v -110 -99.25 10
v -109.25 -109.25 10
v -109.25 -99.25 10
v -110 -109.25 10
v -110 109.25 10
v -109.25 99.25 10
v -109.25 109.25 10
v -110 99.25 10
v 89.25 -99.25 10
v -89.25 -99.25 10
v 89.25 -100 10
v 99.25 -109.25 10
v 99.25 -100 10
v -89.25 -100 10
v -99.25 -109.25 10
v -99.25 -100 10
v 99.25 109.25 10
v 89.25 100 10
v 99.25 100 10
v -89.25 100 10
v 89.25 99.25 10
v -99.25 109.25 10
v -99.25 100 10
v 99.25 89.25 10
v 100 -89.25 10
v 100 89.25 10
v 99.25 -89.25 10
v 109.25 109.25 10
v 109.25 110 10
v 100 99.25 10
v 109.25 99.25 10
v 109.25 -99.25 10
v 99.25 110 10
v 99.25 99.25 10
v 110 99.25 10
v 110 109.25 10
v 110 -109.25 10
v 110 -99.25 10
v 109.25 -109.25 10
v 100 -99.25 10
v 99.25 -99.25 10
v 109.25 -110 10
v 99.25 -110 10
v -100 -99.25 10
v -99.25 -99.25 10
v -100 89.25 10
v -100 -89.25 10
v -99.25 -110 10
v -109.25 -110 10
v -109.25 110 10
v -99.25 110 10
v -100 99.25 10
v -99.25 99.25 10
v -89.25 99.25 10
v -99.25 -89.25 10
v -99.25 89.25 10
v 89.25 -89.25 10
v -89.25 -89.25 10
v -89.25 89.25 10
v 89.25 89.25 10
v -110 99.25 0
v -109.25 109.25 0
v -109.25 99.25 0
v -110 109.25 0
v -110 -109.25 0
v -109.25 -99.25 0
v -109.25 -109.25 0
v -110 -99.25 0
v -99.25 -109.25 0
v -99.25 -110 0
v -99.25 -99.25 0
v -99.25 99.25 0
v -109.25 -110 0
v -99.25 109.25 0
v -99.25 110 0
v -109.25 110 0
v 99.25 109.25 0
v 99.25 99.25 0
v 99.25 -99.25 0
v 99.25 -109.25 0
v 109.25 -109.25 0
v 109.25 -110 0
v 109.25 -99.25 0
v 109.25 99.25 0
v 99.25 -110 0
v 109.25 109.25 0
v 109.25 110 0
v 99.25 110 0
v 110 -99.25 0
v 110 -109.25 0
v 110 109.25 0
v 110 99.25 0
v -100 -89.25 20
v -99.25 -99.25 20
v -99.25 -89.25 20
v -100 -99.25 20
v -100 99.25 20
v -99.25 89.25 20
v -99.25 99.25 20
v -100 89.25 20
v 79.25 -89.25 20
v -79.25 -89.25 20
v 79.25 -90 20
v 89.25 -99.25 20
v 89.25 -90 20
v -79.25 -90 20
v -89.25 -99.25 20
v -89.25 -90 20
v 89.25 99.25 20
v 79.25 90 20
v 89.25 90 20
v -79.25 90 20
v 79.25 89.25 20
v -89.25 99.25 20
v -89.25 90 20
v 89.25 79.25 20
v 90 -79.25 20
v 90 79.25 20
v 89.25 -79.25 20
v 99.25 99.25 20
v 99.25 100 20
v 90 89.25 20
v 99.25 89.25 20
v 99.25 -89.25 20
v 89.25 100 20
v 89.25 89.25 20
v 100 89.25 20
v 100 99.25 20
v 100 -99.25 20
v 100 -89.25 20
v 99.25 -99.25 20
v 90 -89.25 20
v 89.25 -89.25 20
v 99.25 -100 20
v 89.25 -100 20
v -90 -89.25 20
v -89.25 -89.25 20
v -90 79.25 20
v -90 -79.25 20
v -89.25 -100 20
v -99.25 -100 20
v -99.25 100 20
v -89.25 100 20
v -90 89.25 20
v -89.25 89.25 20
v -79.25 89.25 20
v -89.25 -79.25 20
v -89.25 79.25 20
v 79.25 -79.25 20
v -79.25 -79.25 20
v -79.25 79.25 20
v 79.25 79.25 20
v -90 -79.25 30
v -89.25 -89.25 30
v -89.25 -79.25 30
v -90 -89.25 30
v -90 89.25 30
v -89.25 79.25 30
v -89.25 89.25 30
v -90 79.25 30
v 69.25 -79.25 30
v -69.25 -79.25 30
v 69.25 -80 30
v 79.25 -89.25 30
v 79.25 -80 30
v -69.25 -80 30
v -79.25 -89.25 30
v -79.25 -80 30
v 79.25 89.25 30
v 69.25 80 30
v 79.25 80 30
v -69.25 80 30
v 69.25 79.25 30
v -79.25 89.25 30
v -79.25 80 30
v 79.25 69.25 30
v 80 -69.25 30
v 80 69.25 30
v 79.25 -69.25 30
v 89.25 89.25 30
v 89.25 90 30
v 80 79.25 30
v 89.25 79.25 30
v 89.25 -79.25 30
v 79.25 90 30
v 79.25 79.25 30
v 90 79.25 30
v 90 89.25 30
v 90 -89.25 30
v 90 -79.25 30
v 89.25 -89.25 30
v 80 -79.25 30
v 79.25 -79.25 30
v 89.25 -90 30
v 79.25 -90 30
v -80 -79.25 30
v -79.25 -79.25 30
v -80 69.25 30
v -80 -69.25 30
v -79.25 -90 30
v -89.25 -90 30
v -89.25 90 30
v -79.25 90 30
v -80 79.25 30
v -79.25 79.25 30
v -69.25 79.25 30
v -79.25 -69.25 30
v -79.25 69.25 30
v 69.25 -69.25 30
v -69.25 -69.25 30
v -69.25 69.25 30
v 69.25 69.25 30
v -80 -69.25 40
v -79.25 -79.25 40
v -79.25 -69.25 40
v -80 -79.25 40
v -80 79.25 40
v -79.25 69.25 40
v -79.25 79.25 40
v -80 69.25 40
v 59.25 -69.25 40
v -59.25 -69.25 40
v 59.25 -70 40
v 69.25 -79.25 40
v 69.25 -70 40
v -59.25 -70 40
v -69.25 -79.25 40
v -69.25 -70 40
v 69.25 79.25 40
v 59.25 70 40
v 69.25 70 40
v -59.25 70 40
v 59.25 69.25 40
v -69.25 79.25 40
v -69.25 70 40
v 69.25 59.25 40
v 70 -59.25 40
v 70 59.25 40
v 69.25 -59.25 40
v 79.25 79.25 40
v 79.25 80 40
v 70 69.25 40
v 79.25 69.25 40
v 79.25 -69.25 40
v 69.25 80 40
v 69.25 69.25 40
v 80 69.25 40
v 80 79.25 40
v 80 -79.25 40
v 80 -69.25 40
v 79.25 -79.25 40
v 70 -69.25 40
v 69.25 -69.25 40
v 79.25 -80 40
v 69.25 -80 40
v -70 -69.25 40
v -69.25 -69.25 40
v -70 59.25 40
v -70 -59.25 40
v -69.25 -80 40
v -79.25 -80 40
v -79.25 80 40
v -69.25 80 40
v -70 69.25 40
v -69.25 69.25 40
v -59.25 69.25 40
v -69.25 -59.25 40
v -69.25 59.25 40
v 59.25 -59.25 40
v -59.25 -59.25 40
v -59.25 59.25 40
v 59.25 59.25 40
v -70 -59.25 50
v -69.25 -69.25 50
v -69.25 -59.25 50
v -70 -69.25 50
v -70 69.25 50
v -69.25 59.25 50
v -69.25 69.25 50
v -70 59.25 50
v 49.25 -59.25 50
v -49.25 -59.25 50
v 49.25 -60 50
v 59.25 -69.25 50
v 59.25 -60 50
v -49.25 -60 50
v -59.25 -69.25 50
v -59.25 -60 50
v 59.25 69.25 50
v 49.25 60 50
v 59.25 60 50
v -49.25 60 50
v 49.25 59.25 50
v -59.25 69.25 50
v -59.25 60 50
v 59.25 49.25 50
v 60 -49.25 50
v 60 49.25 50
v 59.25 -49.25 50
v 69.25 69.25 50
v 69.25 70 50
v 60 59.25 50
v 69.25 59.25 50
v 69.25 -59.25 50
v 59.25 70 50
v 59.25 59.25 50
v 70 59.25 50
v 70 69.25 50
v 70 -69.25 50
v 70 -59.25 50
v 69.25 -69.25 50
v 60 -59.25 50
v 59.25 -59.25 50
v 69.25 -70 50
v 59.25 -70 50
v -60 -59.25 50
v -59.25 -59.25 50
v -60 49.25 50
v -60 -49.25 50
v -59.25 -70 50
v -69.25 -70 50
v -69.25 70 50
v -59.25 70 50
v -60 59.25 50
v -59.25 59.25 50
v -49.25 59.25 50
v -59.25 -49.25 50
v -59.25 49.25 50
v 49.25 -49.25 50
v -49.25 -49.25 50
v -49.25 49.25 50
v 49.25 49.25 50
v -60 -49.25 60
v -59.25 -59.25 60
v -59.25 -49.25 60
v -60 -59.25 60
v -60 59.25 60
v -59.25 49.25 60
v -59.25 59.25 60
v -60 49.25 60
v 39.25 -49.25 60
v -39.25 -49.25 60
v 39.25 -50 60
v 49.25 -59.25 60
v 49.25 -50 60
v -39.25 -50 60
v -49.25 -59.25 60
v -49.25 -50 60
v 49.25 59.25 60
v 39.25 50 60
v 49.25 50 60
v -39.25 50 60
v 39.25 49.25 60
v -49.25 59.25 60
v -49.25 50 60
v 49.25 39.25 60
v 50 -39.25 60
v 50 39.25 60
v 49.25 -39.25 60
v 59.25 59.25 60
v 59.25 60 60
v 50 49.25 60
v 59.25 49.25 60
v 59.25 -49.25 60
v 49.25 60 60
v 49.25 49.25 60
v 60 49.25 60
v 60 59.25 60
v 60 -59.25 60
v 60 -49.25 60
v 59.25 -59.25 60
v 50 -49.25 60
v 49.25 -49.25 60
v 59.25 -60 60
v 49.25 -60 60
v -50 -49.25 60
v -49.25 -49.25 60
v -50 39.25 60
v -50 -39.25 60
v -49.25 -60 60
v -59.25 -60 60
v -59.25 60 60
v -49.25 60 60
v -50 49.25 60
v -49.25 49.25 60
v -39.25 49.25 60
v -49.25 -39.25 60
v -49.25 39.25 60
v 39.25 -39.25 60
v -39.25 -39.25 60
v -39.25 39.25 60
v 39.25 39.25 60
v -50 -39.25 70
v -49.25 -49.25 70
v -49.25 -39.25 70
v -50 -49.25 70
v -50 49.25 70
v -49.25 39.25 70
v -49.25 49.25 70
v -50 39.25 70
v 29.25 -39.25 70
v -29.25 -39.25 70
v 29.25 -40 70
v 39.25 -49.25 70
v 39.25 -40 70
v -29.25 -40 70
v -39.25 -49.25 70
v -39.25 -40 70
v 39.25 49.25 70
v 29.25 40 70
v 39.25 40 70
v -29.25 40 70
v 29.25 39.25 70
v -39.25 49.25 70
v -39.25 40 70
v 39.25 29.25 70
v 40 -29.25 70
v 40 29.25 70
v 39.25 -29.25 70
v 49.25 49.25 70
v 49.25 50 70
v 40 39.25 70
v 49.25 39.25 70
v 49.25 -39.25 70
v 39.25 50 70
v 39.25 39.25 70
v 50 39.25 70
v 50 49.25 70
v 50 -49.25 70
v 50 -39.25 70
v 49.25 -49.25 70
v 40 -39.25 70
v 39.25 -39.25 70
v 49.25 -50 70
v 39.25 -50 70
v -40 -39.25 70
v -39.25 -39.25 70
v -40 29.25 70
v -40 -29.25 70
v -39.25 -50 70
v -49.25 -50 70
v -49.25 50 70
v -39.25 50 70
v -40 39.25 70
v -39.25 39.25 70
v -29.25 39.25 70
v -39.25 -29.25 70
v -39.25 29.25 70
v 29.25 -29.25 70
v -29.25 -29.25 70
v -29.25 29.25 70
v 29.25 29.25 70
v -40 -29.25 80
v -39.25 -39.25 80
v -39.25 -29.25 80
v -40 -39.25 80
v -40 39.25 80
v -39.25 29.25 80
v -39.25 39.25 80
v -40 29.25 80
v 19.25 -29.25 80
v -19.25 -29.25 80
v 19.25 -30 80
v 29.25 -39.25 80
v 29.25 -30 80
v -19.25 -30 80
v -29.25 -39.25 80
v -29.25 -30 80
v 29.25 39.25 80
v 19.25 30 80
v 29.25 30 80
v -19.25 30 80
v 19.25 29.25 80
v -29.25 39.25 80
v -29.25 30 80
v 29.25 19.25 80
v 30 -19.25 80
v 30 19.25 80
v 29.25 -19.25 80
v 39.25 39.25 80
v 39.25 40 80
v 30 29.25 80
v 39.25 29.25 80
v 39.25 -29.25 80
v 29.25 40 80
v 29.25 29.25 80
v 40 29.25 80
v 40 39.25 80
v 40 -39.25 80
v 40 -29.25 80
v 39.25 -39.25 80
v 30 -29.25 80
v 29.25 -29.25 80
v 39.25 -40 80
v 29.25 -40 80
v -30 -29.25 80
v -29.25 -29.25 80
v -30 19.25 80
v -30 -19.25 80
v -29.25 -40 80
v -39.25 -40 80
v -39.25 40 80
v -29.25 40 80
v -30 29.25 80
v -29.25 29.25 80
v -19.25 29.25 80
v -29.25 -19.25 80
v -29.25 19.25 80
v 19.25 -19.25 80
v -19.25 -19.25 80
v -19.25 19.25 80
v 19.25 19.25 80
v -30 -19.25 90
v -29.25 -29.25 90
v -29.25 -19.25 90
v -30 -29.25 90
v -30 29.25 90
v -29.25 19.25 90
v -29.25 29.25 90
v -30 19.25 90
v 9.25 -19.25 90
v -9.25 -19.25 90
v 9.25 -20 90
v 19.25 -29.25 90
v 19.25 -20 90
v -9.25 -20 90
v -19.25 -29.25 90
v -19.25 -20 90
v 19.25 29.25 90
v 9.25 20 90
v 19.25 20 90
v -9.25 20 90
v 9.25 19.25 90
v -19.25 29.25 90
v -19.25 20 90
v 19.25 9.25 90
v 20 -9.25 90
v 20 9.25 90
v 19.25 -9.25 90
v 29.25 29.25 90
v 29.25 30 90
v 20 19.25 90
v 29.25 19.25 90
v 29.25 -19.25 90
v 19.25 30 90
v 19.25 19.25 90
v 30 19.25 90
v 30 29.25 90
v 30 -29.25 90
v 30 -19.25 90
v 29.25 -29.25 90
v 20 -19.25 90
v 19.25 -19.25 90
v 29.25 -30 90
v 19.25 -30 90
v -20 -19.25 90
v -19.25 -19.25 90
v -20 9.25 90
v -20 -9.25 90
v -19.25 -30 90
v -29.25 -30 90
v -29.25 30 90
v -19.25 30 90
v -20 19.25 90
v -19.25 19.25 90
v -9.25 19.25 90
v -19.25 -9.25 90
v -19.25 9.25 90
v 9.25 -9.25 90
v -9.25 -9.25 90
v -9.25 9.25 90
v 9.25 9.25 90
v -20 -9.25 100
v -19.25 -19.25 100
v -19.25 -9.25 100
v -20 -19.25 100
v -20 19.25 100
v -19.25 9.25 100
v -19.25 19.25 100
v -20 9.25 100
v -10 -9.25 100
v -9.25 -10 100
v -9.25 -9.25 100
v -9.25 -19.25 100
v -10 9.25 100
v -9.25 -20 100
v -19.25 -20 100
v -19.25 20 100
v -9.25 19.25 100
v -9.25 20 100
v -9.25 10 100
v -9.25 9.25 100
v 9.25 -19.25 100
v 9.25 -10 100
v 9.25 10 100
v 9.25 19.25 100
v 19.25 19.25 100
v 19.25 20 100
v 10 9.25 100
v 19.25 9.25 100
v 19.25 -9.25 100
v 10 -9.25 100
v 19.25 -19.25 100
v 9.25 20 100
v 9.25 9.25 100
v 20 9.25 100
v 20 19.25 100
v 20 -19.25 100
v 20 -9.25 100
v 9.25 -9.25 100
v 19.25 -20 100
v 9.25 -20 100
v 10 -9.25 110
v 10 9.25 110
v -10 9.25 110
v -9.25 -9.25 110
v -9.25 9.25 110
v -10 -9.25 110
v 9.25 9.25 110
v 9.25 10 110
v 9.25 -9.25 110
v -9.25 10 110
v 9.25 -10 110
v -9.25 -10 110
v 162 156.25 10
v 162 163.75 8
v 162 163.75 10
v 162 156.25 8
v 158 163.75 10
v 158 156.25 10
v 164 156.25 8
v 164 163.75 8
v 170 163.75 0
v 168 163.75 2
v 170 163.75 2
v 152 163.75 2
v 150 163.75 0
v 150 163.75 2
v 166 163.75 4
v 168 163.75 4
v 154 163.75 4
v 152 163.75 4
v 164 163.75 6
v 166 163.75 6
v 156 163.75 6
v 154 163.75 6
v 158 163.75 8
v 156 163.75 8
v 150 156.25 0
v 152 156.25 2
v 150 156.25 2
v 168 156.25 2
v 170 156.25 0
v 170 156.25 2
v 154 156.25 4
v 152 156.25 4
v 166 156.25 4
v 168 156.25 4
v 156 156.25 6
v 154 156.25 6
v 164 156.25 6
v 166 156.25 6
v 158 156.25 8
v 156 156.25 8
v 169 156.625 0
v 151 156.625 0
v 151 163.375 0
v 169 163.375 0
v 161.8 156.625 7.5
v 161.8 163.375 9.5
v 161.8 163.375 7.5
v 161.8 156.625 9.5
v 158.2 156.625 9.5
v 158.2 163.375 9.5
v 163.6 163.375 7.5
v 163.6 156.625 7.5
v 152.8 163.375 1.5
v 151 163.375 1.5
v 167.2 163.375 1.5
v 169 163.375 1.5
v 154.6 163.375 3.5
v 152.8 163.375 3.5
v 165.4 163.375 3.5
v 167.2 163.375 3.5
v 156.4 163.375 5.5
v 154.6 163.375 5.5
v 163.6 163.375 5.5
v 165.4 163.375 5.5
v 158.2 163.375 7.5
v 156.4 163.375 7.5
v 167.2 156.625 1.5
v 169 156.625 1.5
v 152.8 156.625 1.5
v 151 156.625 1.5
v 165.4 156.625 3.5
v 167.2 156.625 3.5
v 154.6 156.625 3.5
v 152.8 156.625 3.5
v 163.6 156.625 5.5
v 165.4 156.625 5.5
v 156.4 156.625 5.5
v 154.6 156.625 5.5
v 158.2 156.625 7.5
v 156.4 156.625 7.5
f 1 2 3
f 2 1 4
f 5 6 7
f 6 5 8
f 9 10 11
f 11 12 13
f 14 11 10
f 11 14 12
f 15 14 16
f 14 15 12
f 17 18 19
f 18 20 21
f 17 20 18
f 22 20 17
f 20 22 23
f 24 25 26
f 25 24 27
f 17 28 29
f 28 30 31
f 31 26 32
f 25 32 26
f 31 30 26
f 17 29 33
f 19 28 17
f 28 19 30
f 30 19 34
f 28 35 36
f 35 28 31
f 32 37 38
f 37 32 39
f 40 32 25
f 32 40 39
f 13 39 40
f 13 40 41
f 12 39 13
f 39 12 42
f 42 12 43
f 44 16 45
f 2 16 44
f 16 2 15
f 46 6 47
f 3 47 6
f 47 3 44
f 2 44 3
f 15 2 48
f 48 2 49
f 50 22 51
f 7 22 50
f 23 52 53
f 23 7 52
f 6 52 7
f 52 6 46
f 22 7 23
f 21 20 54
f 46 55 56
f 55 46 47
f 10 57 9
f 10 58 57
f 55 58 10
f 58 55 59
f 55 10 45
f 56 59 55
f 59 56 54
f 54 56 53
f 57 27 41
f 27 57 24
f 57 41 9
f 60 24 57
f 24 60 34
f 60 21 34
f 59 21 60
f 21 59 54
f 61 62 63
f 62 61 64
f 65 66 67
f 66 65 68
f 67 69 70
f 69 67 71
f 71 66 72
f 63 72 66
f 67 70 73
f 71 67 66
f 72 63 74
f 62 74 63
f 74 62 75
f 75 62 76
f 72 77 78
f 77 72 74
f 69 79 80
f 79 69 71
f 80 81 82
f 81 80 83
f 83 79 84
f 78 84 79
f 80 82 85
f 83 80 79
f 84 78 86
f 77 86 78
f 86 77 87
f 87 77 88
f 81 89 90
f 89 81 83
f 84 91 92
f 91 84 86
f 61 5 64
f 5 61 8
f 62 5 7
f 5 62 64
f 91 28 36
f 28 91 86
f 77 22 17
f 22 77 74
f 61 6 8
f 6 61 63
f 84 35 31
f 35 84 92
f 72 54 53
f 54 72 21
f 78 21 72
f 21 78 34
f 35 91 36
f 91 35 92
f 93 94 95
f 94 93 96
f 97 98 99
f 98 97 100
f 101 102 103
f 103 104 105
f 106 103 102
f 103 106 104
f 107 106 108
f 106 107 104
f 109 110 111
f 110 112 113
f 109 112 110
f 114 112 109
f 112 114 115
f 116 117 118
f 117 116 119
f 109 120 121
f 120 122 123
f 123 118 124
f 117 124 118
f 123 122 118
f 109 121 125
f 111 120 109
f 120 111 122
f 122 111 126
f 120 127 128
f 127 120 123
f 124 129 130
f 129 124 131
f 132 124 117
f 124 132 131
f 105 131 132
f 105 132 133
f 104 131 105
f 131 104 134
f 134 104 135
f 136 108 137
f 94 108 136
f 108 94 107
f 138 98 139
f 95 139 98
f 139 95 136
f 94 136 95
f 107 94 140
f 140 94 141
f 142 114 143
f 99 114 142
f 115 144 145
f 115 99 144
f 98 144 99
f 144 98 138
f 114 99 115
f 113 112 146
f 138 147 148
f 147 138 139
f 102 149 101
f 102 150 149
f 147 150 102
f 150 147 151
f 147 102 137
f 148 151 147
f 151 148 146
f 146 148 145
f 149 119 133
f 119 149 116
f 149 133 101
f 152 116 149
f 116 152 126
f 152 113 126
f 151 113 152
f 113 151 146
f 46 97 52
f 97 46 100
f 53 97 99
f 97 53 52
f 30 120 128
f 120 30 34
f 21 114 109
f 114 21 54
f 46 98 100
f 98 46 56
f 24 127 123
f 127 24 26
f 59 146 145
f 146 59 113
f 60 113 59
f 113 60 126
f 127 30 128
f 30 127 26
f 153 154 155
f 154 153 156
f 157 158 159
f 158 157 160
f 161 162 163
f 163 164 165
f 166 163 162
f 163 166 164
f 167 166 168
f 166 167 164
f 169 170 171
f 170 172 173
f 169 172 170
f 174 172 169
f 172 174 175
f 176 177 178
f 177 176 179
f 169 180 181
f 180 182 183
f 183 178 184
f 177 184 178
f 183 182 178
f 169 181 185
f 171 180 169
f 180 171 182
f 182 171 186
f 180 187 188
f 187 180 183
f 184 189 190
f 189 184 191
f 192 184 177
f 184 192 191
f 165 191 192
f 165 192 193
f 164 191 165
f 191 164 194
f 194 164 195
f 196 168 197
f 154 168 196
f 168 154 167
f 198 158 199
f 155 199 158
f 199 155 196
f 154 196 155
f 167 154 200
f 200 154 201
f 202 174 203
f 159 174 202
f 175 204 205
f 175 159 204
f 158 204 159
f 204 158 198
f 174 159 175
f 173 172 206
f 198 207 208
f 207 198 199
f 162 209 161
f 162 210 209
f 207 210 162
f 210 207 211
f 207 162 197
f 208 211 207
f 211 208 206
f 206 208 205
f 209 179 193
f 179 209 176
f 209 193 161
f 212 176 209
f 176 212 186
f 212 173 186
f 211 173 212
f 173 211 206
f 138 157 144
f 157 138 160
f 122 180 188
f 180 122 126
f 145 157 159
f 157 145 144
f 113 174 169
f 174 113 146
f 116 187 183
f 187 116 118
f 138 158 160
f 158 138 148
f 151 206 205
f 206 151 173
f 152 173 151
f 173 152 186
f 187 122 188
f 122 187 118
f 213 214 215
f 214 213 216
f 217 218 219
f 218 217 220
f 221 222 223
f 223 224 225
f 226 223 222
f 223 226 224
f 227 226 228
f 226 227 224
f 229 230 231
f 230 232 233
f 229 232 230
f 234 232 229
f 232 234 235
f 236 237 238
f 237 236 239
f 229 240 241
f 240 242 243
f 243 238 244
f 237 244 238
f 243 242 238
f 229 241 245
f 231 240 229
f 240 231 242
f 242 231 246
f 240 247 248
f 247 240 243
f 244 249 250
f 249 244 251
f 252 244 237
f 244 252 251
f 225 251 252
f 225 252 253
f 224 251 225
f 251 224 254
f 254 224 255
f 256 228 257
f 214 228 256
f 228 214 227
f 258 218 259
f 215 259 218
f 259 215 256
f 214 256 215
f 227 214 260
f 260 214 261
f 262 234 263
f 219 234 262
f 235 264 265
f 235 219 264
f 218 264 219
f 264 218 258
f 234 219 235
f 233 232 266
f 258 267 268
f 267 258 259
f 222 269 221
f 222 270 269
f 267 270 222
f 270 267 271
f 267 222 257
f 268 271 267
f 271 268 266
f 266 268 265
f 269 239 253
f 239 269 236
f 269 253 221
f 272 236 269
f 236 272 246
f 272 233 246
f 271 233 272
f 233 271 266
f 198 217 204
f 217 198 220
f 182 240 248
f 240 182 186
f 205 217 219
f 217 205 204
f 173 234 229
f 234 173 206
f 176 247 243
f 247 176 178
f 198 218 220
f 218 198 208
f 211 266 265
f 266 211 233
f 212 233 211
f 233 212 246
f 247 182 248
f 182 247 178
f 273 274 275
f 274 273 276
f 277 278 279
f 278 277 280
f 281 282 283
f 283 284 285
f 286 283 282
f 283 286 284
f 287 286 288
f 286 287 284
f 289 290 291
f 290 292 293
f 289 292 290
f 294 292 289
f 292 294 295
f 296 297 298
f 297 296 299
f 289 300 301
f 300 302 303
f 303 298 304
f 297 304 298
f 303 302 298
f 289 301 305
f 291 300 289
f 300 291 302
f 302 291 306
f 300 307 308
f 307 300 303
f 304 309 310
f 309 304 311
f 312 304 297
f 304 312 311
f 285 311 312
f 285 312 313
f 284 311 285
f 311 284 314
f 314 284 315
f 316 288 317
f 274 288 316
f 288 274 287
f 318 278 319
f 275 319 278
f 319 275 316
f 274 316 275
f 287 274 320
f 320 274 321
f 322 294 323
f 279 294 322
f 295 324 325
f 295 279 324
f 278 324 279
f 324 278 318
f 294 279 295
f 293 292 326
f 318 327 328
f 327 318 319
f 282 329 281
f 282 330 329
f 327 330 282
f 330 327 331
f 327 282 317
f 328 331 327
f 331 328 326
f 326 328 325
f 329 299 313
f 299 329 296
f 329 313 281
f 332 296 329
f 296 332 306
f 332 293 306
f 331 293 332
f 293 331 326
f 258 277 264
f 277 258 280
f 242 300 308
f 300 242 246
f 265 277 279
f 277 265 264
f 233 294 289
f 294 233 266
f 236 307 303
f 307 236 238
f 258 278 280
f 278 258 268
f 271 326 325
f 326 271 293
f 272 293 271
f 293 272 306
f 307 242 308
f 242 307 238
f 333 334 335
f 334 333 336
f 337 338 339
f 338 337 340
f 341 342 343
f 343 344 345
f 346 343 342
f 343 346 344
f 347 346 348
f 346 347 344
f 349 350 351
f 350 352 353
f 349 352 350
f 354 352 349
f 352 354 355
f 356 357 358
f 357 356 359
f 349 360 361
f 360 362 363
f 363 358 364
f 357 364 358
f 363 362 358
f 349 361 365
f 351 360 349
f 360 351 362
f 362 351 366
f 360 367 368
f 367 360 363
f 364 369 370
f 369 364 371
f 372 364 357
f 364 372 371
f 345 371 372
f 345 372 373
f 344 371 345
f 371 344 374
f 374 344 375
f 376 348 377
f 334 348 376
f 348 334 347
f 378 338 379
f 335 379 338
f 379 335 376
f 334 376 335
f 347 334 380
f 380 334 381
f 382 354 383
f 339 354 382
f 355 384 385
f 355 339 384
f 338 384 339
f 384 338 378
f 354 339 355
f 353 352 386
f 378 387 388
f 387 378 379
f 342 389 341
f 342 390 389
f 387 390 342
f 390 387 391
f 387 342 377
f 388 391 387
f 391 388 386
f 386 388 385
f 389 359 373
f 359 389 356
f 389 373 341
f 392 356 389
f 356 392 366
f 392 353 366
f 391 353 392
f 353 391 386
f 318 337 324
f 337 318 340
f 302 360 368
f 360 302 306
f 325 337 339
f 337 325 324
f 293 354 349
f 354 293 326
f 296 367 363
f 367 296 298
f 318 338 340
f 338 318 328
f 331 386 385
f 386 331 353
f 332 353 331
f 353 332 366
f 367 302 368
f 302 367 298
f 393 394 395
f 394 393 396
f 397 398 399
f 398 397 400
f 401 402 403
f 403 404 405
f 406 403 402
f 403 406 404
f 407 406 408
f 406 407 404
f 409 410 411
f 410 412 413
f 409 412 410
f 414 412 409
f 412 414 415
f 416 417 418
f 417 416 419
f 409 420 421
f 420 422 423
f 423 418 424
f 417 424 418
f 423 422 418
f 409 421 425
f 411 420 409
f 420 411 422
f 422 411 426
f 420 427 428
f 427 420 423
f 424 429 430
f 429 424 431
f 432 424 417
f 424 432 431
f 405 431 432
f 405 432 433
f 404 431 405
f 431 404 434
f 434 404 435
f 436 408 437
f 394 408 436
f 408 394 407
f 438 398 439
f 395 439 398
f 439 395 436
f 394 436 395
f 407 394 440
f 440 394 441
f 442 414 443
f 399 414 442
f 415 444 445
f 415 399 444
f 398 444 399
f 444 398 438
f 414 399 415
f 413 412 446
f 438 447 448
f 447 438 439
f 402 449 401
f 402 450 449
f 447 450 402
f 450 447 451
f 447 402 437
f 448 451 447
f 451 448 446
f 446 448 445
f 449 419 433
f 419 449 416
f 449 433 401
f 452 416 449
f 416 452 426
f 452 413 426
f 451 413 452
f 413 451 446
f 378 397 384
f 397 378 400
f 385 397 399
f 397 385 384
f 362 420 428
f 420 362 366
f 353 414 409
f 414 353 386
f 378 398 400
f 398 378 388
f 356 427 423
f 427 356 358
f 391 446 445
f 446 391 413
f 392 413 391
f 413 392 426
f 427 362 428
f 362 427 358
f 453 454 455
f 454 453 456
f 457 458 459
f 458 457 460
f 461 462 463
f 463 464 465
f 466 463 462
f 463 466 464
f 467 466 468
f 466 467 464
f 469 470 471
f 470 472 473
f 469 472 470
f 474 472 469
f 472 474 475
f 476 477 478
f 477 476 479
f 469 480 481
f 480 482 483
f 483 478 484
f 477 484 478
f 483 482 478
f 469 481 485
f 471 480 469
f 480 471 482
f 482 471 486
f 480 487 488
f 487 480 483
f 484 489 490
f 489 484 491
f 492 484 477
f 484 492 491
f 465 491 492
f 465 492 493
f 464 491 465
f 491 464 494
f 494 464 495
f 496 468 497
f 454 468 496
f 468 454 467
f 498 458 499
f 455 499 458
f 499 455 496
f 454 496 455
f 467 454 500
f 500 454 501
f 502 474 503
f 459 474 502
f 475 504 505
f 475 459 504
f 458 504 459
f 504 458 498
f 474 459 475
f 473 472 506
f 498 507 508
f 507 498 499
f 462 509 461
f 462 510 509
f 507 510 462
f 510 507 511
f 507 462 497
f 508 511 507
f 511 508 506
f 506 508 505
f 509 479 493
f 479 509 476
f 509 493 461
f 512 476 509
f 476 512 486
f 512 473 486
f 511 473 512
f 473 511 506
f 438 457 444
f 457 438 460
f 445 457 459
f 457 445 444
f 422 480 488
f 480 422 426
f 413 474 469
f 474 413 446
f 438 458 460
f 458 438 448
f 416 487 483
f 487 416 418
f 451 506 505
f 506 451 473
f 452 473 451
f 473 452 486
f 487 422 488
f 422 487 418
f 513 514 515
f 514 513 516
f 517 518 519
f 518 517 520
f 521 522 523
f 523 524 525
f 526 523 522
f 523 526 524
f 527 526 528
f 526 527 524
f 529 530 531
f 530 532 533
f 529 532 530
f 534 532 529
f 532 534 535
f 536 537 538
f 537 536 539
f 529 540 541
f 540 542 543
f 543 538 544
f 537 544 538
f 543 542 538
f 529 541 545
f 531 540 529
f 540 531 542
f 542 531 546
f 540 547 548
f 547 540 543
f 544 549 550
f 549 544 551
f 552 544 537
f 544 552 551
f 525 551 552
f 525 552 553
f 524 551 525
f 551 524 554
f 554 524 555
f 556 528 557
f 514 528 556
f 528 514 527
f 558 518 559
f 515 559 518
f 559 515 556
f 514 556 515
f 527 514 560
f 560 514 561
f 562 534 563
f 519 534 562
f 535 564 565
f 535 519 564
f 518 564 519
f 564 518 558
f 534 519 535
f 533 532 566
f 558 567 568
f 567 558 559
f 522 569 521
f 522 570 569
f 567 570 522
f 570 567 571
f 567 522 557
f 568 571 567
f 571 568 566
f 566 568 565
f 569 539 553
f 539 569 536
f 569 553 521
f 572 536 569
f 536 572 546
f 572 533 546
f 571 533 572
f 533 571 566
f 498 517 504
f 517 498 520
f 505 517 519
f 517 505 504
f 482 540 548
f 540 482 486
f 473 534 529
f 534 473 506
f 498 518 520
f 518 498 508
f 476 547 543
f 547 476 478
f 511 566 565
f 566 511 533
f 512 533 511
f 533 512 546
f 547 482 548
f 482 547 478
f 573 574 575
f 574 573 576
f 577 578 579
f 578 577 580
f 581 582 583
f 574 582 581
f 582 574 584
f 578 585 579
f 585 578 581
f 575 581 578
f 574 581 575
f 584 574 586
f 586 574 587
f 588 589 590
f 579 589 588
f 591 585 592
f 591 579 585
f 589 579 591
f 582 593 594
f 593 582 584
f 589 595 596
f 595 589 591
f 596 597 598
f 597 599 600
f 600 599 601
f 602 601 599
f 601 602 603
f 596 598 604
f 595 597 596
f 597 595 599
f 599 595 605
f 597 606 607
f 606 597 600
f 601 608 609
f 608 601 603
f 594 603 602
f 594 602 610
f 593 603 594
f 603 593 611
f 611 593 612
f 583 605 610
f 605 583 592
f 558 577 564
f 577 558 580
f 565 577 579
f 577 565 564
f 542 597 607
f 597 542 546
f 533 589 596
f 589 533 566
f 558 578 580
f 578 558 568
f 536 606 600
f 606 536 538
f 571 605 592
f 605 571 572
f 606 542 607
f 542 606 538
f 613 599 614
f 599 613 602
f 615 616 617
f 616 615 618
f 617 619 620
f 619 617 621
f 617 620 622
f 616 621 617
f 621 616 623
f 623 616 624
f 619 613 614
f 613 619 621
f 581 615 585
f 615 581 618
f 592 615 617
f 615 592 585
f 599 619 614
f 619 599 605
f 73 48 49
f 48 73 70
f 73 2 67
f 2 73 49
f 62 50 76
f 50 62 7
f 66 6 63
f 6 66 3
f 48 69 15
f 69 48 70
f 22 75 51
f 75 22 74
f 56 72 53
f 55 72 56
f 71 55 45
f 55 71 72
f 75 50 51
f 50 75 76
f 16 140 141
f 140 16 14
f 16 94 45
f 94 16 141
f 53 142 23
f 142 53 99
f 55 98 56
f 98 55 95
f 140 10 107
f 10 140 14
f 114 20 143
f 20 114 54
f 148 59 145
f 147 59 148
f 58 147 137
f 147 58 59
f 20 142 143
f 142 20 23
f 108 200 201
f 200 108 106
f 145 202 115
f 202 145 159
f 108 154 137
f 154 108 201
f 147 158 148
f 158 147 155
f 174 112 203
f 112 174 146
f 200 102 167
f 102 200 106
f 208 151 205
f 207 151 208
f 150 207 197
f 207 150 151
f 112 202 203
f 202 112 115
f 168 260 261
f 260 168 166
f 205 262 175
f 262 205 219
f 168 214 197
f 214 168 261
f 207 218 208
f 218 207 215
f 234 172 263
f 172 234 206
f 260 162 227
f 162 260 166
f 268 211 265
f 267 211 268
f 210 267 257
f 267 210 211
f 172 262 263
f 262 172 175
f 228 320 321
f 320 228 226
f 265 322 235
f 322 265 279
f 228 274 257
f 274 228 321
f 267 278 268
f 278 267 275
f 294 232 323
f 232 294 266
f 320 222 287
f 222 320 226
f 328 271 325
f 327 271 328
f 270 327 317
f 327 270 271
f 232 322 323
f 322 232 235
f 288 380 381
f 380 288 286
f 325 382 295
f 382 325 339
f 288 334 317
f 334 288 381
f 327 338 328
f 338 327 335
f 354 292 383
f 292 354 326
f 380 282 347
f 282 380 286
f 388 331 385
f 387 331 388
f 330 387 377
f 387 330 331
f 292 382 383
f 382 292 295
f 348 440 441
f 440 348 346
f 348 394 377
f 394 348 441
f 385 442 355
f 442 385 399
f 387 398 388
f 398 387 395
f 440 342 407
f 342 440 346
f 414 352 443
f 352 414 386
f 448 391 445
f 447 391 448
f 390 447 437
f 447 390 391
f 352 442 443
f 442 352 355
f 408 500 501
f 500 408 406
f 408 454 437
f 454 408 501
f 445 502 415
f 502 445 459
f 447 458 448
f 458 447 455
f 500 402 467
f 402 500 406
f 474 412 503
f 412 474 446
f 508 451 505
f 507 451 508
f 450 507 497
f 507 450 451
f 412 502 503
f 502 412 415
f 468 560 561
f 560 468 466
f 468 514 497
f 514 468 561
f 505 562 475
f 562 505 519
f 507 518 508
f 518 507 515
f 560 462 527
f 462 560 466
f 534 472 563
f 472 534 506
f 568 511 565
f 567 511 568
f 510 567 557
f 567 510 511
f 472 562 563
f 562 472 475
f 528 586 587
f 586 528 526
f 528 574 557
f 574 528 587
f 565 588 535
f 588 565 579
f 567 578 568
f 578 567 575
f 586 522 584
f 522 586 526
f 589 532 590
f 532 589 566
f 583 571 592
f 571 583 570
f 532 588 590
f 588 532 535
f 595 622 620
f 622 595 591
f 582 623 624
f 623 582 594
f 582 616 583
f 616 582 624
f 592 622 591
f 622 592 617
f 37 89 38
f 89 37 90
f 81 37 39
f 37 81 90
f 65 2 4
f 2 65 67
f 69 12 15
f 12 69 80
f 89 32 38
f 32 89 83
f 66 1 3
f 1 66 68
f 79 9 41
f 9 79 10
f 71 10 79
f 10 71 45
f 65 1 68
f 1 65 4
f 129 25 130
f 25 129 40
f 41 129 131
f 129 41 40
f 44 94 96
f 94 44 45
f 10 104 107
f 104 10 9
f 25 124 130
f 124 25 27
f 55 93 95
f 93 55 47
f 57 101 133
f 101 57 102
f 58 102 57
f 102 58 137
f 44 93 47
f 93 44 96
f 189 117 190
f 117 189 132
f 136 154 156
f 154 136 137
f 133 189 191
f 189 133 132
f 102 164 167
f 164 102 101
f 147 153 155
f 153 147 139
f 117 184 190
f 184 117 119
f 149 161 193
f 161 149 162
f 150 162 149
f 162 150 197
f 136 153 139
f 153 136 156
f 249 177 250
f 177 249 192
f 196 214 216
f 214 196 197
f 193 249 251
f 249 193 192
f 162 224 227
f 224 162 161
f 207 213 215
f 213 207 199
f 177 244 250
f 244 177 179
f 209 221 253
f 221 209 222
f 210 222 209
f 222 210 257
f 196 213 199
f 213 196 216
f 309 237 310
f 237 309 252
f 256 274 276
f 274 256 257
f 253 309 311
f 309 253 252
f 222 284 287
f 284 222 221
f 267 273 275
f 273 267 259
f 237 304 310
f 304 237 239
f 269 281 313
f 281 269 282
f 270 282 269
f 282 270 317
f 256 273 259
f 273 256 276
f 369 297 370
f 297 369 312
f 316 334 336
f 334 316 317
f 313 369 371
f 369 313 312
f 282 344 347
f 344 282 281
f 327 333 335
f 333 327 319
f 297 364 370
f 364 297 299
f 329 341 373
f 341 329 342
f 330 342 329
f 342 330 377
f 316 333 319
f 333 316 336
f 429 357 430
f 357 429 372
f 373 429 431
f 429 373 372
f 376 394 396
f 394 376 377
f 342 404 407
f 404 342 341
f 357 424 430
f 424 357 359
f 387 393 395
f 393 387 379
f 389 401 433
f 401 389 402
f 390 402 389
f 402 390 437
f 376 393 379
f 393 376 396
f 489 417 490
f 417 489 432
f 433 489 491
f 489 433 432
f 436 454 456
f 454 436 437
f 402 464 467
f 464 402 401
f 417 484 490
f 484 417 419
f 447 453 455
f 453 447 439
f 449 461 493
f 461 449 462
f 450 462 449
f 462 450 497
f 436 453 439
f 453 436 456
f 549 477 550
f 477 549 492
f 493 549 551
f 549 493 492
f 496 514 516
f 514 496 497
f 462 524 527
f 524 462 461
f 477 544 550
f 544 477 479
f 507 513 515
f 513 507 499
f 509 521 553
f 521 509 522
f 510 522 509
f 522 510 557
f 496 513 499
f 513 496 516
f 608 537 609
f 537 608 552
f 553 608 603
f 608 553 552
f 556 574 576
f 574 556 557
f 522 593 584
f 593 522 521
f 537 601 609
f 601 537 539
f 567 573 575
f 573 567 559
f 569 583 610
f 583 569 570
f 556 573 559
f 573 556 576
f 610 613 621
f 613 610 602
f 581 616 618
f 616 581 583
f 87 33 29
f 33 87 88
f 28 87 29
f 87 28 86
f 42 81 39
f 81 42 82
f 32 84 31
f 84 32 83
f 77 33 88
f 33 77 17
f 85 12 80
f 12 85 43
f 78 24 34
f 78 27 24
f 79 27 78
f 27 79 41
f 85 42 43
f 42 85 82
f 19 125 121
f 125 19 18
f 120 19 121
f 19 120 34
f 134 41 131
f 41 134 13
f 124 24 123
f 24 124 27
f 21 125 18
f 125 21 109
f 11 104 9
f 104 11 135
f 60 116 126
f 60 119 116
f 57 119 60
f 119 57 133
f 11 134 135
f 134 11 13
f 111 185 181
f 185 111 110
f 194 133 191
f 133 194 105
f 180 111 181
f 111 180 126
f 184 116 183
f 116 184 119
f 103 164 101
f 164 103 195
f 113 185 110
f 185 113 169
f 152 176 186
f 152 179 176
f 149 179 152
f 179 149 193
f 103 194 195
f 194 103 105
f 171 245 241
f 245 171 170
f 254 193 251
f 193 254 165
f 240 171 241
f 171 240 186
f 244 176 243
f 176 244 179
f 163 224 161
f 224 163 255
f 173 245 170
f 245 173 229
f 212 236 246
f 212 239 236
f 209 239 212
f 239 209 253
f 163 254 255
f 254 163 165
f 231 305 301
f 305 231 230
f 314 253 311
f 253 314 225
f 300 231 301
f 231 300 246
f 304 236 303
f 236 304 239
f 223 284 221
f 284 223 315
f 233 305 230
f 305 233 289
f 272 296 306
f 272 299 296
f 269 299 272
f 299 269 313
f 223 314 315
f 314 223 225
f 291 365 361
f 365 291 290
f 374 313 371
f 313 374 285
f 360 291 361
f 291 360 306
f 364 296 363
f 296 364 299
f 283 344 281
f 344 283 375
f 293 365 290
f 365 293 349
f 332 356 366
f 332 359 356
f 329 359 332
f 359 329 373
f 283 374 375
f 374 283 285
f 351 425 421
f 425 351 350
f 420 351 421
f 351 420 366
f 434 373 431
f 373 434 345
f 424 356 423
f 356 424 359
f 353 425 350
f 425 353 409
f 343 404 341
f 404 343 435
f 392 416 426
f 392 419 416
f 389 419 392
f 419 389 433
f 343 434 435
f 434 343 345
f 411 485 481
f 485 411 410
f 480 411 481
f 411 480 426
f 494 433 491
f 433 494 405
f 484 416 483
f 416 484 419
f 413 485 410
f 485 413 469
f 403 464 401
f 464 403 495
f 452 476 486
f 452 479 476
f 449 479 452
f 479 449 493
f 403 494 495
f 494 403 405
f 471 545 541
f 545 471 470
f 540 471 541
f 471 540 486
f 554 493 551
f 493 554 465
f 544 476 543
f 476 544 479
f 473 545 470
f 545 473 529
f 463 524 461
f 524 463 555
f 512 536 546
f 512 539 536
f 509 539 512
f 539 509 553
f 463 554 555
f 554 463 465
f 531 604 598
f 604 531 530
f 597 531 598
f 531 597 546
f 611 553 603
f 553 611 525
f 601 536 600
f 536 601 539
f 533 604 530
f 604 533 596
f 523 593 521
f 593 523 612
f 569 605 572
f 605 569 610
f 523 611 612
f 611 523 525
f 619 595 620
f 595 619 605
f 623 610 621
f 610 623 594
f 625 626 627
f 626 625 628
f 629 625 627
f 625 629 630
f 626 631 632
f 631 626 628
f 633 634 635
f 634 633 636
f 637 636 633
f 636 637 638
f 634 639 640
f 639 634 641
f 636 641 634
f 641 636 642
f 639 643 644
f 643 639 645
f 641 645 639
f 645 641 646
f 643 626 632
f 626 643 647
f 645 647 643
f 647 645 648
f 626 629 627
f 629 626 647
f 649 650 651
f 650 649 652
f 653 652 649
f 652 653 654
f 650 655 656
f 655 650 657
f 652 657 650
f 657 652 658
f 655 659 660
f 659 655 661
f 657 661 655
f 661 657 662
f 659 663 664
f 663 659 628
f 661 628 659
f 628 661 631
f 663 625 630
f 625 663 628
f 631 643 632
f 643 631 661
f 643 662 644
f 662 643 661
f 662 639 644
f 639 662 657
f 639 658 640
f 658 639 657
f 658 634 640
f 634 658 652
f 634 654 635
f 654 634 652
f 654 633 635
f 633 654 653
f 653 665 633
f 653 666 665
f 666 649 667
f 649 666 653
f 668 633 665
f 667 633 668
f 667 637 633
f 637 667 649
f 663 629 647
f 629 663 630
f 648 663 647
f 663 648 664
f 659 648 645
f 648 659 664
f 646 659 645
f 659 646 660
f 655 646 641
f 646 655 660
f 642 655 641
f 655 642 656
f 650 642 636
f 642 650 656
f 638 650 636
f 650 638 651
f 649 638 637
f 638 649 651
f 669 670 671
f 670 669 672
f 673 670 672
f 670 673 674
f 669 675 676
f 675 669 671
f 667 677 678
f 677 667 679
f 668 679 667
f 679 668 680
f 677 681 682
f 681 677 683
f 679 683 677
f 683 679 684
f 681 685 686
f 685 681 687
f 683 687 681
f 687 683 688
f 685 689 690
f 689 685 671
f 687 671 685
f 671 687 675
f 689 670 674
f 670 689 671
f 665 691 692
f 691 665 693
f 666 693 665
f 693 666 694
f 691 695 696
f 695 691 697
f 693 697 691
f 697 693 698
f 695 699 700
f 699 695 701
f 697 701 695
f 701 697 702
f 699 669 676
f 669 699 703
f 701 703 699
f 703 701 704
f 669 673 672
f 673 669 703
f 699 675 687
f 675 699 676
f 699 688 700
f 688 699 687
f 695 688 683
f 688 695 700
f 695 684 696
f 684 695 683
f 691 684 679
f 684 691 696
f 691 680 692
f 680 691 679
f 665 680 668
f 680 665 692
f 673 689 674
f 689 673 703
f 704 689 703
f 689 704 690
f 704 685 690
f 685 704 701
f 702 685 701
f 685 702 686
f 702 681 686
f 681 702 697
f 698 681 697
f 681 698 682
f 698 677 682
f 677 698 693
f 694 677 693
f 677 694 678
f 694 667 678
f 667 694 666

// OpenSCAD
scale = 100; // [50:10:250]
pyramid(scale=scale);
translate([(scale*0.4)*(scale*0.04),(scale*0.4)*(scale*0.04),0])
mirrored_stairs_mold(scale=scale);

//*****All modules that were used for this******

//************************************************
// Stairs.scad: Produces 1 set of stairs
//
//			   <--->xdelta
//			   |   |
//			---	   |  |
//	zheight|	   |  |
//		---		   | / <ywidth
//	   |		   |/ 
//		<--xlength->

//************************************************

module stairs(xlength=20, xdelta=2, ywidth=5, zheight=2)
{
	for(x=[xlength:-xdelta:0])
	{
		translate([0,-ywidth/2,zheight*x/xdelta]) 
		color([sin(x*xdelta),sin(x*ywidth),sin(x*zheight)]) //use sin(x) function to make sure the value is between 0 and 1
		cube([xlength-x,ywidth,zheight]);
	}
}
//************************************************
module pyramid_side(ywidth=5,xlength=20,zheight=20,ystep=10){
	union()
	{
		translate([0,ystep*(ystep+1.3),0]) //figuring out the right factor for smooth pyramid-style
		{
			for(z=[0:zheight:ystep*zheight])
			{
				for(x=[-xlength*ystep+z:2*xlength:xlength*ystep-z]) //this one ensures that we get a triangular side of a pyramid
				{
					
					translate([x,-(z/zheight)*ystep,z])
					{
						translate([0,-((ystep-ywidth)/2)-ywidth,zheight/2])
						color([sin(x),cos(z),0])
						cube([2*xlength,ystep,zheight],center=true);
					}
				}
			}
		}
	}
}
//************************************************
module pyramid(scale=200)
{
	ywidth = scale/200*15;
	ystep = scale/10;
	xlength=scale/10;
	zheight=scale/10;
	for(r=[0:90:359])
	{
		rotate([0,0,r])
		pyramid_side(ystep=ystep,ywidth=ywidth,xlength=xlength,zheight=zheight);
	}
}
//************************************************
module mirrored_stairs(scale=200)
{
	ywidth = scale/200*15;
	xlength=scale/10;
	stairs(ywidth=ywidth,xlength=xlength);
	mirror([1,0,0])				//mirror the stairs for double stair-pair awesomeness
	stairs(ywidth=ywidth,xlength=xlength);
}
//************************************************
module mirrored_stairs_mold(scale=200)
{
	difference()
	{
		mirrored_stairs(scale=scale);
		scale([0.9,0.9,1])
		translate([0,0,-0.5])
		mirrored_stairs(scale=scale);
	}
}
